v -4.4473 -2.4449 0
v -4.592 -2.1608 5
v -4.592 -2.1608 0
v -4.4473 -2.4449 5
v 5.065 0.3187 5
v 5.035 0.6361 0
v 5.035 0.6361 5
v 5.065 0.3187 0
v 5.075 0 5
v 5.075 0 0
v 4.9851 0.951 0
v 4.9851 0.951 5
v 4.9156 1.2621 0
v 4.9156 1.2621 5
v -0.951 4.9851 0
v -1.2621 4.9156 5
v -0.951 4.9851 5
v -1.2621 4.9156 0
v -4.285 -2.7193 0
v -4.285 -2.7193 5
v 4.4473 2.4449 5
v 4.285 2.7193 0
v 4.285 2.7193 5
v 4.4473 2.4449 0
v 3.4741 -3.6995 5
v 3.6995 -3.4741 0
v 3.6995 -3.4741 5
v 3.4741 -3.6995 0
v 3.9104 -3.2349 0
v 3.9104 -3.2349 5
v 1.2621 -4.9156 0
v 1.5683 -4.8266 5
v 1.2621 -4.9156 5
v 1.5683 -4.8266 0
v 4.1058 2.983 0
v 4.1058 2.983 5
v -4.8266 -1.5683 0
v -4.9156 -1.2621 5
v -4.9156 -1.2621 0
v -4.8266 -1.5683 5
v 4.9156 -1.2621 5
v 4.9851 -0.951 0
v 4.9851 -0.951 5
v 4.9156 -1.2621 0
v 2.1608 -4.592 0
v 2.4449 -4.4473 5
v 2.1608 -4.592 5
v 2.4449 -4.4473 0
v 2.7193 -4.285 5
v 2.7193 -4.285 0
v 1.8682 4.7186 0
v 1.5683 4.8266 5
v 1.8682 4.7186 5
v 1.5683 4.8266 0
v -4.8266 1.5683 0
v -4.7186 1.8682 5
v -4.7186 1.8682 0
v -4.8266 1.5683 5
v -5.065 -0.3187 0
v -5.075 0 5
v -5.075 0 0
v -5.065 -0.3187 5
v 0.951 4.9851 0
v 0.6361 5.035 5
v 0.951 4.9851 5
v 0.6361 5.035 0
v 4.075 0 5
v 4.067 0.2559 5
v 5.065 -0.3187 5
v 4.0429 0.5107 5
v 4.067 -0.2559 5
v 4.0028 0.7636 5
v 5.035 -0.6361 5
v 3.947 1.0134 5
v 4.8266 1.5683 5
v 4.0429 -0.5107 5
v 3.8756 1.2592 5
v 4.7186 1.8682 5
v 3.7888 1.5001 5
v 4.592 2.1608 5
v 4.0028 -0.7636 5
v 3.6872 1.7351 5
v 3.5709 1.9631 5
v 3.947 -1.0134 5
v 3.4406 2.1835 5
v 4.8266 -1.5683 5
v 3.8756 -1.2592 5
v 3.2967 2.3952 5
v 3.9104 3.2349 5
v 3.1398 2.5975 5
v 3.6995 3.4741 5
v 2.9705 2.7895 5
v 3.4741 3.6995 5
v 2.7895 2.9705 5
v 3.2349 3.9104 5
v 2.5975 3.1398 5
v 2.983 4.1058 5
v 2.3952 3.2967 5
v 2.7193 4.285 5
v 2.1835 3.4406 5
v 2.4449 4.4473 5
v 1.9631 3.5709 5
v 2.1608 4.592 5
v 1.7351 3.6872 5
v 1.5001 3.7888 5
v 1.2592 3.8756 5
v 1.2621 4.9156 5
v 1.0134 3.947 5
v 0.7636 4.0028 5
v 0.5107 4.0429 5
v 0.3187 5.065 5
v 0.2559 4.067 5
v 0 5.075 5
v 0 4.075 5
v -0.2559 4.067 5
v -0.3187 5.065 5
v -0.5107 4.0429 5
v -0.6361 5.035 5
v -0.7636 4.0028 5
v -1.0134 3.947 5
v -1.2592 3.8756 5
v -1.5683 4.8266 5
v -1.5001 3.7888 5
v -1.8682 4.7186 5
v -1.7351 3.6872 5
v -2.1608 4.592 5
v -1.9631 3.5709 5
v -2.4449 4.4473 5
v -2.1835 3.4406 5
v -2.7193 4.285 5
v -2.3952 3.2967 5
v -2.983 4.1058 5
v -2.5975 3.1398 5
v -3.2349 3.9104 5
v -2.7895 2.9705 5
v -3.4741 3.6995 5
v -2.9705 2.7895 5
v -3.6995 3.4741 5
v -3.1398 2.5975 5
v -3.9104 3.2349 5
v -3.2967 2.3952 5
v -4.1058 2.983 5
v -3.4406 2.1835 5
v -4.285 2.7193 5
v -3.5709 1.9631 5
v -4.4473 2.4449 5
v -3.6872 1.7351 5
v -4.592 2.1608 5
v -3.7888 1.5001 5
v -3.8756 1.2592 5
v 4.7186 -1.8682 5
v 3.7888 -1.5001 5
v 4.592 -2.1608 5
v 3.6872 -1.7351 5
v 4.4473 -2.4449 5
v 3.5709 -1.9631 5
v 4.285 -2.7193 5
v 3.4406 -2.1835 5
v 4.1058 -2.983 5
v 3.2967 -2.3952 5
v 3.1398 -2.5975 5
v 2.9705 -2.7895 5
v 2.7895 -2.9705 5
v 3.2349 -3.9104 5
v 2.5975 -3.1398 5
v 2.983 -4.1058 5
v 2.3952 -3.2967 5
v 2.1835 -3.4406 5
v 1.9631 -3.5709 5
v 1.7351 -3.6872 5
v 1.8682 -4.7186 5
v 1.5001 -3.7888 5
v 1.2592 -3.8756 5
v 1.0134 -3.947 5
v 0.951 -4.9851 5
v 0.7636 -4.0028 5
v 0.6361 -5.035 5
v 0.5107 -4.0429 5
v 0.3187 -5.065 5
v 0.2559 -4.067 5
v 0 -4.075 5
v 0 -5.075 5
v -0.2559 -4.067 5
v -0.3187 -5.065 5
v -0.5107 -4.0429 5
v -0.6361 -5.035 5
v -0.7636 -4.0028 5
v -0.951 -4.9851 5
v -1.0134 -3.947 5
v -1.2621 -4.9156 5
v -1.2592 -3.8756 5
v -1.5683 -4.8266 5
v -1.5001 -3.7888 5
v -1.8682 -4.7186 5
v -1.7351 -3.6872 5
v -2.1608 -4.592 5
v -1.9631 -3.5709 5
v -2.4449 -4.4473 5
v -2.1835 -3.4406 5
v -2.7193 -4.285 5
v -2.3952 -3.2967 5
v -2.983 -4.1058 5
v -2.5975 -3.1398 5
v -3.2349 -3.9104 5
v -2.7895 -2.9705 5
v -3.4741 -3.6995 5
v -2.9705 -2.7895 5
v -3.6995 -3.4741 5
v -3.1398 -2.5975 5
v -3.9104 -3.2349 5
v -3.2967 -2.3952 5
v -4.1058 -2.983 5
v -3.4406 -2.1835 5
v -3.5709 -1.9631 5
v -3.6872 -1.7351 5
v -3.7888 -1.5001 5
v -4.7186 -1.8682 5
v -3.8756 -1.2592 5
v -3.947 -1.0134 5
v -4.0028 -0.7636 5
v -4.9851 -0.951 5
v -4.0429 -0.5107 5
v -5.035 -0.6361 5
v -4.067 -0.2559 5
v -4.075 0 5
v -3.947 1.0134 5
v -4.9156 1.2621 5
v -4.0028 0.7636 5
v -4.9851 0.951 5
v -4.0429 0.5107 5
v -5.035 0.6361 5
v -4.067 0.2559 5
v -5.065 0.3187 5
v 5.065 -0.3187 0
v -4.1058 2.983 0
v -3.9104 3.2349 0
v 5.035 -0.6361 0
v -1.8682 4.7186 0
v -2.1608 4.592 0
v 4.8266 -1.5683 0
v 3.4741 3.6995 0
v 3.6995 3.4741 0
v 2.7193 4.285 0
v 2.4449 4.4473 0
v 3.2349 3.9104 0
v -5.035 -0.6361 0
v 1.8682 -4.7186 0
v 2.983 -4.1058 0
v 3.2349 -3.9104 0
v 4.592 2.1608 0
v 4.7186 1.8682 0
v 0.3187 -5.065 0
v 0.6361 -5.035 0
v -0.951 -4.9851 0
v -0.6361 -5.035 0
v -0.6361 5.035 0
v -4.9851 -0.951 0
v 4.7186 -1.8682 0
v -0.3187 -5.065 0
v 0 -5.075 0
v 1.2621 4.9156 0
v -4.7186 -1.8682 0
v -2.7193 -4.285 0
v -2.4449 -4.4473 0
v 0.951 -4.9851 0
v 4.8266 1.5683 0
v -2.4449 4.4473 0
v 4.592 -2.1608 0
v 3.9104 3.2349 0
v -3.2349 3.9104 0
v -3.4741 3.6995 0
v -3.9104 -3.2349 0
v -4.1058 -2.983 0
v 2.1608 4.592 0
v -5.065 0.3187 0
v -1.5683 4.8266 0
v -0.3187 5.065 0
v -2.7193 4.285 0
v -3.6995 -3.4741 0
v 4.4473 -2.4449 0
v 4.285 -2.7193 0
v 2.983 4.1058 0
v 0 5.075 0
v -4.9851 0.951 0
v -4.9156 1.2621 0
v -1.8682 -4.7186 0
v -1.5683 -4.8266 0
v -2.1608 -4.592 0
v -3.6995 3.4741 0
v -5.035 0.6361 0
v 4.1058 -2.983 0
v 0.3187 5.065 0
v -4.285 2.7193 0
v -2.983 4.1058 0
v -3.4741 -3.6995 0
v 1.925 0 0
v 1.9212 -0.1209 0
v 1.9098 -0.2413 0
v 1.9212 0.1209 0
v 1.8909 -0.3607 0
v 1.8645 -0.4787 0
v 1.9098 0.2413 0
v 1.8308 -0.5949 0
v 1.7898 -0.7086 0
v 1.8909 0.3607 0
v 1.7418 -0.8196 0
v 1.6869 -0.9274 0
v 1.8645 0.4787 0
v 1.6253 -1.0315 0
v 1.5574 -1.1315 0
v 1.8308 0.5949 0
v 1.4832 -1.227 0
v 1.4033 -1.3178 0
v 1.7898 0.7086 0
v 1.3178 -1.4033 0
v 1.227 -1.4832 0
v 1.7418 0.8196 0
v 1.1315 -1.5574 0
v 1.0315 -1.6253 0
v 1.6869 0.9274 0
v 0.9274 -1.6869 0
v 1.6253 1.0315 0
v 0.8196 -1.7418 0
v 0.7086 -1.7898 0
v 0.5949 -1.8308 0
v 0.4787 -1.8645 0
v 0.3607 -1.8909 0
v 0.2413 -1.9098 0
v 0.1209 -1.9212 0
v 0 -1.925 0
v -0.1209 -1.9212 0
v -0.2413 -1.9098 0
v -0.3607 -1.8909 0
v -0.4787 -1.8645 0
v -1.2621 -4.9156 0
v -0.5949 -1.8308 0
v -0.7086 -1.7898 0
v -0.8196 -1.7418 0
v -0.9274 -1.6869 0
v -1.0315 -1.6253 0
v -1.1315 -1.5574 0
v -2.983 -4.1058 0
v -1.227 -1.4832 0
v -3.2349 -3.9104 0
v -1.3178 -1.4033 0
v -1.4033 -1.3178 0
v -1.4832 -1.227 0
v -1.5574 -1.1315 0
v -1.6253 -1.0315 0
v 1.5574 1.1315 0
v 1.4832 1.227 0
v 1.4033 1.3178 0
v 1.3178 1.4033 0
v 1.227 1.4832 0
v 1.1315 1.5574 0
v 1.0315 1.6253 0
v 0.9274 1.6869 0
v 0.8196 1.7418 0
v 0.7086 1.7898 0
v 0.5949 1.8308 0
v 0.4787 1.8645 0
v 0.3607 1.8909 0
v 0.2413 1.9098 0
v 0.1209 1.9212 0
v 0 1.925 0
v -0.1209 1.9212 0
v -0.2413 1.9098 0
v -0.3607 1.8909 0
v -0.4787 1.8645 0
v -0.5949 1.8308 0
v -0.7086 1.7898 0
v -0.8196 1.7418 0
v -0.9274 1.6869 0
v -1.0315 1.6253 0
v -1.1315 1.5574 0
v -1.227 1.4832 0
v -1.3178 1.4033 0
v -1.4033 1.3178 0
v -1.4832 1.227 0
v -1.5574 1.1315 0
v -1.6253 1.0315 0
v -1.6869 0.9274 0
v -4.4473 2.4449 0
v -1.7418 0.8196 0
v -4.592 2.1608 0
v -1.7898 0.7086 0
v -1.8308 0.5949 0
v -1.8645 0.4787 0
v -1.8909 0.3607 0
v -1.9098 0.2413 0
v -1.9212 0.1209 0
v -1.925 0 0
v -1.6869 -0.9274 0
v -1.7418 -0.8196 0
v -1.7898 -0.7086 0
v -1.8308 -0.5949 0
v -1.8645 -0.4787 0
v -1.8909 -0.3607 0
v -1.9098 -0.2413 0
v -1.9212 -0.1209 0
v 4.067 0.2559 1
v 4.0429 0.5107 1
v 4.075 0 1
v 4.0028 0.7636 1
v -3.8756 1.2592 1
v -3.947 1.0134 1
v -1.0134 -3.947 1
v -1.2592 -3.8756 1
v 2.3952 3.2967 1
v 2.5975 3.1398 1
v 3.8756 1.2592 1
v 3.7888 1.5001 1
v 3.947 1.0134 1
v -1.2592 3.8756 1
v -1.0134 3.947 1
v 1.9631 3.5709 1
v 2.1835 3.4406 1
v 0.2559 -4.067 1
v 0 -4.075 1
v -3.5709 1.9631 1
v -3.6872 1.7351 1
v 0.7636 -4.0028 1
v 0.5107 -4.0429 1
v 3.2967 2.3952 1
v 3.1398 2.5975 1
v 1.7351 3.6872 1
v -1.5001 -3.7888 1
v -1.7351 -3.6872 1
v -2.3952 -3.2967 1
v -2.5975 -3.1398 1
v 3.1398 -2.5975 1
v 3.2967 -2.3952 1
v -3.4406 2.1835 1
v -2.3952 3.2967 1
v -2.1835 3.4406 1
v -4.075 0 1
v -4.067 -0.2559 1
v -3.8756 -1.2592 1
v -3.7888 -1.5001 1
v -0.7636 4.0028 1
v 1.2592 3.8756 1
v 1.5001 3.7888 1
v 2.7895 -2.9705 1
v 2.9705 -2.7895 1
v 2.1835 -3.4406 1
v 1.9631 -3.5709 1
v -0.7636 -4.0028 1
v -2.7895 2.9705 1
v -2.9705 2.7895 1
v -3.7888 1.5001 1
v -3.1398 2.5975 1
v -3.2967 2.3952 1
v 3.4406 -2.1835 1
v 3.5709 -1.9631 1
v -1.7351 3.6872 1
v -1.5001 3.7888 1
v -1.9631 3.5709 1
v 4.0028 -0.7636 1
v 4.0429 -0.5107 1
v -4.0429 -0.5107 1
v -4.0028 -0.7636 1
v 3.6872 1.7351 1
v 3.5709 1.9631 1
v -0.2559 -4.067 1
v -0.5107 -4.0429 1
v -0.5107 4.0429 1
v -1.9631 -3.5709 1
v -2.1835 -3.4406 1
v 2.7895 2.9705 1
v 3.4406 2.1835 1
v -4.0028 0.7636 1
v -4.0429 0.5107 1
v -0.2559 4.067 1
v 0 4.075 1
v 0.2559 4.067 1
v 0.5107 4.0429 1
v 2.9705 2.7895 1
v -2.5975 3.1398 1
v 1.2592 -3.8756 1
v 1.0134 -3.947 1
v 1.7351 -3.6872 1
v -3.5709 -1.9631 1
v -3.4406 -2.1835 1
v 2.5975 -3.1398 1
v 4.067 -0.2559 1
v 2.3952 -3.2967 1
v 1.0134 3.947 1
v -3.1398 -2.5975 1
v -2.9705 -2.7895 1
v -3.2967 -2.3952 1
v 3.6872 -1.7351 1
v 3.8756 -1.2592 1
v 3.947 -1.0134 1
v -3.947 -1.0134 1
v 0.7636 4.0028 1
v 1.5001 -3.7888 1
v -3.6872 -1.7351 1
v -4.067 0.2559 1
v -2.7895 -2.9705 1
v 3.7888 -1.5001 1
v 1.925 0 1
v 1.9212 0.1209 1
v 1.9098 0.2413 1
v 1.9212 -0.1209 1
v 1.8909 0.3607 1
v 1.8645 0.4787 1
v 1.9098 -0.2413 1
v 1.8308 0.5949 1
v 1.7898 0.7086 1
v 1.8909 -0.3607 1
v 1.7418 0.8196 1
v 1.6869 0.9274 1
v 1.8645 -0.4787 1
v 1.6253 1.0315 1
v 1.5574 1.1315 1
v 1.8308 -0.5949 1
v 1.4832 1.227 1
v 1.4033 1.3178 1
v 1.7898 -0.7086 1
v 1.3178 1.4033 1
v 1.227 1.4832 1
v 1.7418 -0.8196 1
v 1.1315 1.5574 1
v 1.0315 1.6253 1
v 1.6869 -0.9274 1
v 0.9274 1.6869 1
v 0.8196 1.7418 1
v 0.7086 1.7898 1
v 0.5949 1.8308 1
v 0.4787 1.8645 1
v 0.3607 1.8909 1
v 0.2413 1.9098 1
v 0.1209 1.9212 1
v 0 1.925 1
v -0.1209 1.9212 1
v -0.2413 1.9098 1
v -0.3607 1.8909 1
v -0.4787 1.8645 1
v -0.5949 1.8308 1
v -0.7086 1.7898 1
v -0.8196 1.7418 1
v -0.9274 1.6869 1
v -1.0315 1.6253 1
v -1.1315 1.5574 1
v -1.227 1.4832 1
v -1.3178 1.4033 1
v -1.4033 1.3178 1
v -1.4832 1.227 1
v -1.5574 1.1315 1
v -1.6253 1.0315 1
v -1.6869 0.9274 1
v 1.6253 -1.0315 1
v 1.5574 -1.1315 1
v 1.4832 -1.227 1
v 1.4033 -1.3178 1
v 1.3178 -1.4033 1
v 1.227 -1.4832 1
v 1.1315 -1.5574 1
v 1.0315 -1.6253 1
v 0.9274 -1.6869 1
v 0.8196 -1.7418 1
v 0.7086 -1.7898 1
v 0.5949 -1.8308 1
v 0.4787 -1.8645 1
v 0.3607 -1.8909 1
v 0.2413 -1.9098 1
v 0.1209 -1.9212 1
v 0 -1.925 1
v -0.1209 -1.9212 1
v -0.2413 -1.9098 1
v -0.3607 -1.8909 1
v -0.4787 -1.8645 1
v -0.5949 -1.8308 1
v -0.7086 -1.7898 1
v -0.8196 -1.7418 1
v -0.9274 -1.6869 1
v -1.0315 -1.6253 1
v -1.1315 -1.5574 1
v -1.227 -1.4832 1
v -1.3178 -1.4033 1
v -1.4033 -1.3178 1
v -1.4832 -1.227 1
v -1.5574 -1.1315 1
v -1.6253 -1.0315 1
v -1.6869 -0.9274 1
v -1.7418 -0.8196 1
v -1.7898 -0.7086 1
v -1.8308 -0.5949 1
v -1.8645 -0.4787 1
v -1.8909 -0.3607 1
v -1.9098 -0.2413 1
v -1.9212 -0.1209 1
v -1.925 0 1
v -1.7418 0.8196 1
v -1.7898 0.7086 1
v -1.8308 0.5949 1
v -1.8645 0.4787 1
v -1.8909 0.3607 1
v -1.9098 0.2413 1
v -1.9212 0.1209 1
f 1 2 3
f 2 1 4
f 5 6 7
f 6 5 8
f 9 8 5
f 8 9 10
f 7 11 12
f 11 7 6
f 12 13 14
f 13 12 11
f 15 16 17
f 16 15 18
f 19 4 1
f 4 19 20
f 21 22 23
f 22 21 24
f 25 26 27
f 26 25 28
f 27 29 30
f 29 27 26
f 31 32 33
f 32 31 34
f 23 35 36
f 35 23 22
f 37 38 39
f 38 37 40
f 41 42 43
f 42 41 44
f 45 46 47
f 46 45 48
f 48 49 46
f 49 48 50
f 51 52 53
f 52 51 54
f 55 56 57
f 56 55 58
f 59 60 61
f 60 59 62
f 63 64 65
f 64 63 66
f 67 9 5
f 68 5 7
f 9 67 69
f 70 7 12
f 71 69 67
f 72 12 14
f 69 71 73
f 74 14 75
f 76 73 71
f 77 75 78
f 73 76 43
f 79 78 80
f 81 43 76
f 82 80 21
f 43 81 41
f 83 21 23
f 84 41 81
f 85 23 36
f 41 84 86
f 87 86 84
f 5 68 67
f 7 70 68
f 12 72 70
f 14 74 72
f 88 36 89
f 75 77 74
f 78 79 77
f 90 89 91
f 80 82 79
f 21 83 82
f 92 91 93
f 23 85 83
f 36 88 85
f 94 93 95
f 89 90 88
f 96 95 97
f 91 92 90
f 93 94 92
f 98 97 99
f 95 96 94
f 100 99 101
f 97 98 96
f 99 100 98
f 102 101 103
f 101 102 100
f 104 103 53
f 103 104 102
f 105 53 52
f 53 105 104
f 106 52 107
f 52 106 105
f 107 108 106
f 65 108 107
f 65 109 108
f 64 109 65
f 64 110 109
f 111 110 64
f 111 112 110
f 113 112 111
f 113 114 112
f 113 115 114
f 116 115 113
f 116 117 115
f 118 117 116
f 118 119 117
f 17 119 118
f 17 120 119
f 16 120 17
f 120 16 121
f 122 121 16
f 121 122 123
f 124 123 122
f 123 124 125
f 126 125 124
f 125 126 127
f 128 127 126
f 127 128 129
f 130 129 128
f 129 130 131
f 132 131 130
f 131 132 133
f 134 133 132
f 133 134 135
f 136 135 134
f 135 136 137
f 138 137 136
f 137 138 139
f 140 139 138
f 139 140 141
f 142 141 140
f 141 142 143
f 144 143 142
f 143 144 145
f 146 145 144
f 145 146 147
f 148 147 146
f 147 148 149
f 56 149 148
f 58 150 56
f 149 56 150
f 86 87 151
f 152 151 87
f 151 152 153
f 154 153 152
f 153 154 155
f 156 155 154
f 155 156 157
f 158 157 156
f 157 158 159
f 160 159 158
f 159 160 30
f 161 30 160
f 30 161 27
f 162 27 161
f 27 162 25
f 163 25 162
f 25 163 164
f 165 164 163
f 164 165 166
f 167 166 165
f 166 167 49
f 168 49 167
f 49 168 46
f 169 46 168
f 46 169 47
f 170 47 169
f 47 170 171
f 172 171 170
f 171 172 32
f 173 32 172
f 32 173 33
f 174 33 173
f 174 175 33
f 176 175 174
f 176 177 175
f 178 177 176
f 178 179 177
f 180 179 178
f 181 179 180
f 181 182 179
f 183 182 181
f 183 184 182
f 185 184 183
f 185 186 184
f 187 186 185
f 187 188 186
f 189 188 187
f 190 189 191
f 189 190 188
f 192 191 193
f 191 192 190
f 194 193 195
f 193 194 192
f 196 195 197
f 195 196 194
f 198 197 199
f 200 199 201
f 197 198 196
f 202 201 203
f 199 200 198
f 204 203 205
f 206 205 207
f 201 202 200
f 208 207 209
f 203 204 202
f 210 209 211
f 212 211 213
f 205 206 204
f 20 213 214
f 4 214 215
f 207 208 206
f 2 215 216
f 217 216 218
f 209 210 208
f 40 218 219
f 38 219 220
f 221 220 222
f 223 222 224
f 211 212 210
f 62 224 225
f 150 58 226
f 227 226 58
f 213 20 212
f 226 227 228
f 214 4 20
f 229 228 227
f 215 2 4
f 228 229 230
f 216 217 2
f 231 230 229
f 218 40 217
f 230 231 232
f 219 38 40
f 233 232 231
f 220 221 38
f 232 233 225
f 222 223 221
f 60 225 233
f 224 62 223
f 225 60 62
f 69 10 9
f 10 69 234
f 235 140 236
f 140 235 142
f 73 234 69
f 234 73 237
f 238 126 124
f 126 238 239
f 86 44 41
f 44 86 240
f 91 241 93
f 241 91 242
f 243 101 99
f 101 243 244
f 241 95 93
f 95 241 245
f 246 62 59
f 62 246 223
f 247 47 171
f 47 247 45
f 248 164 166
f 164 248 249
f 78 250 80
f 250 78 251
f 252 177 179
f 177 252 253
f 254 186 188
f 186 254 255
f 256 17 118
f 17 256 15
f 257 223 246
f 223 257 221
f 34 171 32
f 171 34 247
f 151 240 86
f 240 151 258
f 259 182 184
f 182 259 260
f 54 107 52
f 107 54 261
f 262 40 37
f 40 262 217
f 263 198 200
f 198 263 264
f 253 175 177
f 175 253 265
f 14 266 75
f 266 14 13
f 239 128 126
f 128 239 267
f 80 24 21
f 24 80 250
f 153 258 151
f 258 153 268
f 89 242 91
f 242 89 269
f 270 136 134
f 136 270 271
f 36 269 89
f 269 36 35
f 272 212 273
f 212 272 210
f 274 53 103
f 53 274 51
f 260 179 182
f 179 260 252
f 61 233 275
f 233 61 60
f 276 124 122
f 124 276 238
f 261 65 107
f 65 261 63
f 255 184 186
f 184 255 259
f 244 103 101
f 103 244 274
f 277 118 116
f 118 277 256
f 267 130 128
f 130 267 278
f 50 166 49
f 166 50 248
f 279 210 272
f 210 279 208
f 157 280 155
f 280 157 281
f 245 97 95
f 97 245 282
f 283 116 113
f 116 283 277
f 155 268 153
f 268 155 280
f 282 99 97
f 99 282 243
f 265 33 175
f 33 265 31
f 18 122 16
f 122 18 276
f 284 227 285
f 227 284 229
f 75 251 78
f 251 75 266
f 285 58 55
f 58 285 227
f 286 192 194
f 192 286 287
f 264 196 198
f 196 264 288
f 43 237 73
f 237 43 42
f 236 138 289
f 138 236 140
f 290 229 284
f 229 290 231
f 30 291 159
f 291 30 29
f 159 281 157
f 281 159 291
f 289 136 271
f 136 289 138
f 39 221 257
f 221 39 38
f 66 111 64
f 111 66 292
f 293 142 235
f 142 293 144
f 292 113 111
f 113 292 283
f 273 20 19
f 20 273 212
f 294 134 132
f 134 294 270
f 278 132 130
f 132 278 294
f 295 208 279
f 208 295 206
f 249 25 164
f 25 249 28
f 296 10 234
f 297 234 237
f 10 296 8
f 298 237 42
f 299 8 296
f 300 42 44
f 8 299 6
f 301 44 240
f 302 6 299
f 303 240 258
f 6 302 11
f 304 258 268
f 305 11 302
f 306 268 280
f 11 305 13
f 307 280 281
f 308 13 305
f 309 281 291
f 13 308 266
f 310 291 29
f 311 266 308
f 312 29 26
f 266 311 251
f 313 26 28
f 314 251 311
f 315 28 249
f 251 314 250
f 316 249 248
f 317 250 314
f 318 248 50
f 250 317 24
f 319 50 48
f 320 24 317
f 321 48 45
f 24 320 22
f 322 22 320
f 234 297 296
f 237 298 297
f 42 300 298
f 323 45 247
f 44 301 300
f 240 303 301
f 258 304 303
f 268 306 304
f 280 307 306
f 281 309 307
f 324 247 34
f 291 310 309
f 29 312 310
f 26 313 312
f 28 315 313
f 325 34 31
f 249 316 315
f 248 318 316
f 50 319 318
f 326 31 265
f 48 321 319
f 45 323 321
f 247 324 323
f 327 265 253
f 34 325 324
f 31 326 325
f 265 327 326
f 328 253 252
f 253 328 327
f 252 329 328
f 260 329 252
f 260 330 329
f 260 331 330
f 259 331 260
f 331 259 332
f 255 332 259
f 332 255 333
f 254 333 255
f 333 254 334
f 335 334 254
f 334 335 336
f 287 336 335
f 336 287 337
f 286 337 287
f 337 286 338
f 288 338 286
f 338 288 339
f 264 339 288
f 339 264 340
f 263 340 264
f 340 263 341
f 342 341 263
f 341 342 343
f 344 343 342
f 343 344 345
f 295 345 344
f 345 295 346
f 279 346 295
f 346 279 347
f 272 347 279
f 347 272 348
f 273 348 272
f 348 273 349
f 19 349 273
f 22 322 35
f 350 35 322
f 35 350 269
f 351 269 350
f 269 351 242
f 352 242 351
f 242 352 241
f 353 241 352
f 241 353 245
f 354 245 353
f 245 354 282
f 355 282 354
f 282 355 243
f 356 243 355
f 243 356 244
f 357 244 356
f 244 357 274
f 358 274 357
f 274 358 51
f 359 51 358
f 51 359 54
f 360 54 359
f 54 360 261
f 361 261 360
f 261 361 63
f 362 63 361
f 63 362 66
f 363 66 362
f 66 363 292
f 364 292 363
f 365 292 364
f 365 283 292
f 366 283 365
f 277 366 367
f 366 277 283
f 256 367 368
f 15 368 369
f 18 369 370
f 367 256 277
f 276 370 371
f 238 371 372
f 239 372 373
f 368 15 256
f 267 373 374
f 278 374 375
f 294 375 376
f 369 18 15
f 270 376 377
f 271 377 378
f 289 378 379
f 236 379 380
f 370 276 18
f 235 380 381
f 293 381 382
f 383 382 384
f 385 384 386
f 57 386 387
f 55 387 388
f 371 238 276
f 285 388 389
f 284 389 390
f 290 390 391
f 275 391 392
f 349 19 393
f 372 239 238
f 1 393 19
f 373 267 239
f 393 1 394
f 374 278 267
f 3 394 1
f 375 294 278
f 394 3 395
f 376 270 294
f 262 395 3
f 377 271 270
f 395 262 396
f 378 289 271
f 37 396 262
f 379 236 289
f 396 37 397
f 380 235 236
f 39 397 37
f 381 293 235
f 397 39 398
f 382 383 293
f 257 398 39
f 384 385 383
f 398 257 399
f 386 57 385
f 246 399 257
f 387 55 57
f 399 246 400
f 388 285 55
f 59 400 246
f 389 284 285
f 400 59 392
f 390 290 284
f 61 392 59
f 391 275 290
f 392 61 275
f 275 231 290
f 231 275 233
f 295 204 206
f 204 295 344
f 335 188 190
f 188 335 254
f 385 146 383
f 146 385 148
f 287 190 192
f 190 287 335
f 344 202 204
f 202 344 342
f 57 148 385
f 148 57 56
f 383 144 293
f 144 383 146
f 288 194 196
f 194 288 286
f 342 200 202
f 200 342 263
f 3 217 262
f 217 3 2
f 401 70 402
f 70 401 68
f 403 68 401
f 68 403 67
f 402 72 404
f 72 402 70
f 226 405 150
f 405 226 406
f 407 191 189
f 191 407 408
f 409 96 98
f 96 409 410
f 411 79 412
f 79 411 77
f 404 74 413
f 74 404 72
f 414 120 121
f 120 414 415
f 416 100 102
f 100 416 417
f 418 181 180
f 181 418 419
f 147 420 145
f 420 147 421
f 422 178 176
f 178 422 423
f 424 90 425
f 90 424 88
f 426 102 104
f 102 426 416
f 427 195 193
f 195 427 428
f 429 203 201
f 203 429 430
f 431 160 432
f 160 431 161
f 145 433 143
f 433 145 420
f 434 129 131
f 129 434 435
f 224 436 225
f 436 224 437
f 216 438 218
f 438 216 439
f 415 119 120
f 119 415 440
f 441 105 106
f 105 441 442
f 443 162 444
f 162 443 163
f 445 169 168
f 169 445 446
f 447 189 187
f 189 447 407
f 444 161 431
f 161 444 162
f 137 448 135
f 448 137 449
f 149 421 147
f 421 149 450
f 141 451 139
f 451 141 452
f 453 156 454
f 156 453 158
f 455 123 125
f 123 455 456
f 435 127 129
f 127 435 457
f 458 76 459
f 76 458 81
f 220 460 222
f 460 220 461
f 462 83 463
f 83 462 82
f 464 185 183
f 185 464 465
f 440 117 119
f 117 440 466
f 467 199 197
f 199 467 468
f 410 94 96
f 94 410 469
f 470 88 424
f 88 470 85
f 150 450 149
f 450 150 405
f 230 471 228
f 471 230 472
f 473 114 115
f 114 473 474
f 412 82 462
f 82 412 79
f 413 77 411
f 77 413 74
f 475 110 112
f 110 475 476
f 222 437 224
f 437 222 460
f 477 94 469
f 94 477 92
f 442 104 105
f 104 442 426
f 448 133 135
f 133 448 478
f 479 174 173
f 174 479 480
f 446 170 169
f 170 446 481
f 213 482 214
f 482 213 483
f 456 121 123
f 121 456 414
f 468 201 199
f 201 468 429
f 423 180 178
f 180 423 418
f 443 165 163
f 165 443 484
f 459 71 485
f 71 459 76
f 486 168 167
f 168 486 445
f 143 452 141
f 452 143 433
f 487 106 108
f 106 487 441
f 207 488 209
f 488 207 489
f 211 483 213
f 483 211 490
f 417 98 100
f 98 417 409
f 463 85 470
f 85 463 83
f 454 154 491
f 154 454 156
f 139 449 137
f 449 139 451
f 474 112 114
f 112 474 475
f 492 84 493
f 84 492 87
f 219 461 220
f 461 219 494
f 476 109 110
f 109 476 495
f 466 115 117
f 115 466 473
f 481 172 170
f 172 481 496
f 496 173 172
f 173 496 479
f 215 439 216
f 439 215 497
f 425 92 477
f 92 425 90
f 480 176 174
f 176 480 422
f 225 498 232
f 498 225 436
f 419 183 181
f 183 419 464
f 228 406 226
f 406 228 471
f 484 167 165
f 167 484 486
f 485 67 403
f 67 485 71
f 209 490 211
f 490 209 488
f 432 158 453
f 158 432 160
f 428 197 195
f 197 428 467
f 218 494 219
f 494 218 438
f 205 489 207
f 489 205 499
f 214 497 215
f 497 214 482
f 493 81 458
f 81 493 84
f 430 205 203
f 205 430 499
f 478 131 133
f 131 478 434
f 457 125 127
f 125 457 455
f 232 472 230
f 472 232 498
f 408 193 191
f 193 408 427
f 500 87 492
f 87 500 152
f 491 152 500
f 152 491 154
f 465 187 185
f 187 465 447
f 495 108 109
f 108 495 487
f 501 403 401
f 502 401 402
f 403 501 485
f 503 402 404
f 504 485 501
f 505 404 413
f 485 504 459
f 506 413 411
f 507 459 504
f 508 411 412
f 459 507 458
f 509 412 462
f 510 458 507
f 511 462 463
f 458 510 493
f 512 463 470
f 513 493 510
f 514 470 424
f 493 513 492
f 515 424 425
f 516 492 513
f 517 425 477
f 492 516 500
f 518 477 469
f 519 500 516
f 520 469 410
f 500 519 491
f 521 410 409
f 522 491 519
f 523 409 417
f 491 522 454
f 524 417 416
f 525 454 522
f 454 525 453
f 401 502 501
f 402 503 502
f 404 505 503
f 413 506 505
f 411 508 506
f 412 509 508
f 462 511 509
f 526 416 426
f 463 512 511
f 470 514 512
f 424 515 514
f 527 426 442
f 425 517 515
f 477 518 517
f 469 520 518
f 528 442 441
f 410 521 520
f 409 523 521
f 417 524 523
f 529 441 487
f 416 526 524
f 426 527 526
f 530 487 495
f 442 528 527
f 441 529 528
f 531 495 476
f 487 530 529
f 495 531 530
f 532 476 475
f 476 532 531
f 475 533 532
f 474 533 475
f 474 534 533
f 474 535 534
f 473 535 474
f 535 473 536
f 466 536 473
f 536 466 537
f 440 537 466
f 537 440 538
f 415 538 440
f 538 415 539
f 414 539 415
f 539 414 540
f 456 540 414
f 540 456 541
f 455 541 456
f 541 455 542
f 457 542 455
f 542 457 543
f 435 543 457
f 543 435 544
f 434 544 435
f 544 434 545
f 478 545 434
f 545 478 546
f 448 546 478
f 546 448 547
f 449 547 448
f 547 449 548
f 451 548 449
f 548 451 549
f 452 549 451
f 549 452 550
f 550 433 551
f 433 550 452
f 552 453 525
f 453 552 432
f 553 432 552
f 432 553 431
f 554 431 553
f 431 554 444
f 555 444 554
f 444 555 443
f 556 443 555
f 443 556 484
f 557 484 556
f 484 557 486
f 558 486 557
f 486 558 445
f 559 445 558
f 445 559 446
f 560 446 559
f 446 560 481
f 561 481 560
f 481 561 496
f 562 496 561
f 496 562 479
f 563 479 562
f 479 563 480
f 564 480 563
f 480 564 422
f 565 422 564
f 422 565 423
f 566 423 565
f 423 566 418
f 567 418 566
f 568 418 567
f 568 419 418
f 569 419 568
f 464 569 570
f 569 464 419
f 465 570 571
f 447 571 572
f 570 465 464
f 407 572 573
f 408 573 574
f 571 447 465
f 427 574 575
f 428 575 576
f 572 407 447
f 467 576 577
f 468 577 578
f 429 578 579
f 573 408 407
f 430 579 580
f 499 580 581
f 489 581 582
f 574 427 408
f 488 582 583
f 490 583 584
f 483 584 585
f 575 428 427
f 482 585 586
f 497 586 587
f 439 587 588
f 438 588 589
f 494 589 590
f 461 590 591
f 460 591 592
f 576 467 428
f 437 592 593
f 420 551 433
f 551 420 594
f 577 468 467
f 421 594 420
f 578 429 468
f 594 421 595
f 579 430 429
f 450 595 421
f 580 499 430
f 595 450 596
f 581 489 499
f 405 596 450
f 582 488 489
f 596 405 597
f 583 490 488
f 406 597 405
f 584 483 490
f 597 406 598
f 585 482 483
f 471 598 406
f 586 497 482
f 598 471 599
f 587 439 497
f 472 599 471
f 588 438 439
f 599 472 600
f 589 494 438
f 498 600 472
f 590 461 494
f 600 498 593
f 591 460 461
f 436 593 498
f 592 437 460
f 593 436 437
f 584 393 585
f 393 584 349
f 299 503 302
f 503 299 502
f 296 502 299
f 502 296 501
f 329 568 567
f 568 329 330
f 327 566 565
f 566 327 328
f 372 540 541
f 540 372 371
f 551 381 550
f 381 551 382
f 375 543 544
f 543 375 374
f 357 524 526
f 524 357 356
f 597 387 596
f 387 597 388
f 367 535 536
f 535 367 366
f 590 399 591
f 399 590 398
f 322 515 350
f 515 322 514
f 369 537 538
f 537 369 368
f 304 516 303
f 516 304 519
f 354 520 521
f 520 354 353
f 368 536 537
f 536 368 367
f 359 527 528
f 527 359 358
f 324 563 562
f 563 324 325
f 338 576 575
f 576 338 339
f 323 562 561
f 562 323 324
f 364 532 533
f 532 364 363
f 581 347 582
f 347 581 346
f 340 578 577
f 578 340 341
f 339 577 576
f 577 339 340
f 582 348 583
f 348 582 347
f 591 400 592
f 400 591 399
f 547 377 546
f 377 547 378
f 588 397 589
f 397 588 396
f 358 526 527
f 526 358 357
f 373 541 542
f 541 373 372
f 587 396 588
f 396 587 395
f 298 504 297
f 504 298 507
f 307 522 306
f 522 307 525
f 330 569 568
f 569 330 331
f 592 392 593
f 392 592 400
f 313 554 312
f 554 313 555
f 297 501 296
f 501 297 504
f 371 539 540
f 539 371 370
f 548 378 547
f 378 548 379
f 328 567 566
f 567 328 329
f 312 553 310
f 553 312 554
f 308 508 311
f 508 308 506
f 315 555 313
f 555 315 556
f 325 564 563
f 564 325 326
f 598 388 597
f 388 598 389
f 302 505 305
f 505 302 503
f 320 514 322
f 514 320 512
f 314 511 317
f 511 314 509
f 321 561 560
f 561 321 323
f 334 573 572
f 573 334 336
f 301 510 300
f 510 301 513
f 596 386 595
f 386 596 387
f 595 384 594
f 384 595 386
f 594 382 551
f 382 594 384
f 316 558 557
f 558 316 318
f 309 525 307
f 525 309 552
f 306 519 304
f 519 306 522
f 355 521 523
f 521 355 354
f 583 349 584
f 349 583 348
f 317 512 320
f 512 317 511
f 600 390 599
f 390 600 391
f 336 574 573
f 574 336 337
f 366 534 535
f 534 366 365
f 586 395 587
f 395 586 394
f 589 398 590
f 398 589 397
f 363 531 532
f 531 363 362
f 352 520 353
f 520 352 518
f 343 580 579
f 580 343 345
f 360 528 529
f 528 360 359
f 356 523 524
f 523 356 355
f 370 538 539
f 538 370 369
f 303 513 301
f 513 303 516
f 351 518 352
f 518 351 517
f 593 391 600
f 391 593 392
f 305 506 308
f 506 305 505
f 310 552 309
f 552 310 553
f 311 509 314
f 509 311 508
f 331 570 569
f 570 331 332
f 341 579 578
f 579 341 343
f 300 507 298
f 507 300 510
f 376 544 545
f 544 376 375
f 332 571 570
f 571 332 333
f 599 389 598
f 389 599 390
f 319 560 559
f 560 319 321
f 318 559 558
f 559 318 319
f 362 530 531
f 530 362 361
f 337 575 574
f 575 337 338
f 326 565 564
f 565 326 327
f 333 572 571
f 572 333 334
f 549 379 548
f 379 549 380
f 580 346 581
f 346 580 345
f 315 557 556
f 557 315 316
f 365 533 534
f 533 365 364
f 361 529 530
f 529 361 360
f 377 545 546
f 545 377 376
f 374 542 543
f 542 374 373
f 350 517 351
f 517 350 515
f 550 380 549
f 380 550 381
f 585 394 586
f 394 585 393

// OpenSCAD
$fn=100;
cl=0.25;
height=5;
diam=7.9+cl; // diametro interno
thick=1;
m3=3.6+cl;

difference(){
    cylinder(h=height, d=diam+thick*2);
    
    translate([0,0,thick])
    cylinder(h=height, d=diam);
    // M3 screw
    translate([0,0,-0.1])
    cylinder(h=height, d=m3);    
}    
